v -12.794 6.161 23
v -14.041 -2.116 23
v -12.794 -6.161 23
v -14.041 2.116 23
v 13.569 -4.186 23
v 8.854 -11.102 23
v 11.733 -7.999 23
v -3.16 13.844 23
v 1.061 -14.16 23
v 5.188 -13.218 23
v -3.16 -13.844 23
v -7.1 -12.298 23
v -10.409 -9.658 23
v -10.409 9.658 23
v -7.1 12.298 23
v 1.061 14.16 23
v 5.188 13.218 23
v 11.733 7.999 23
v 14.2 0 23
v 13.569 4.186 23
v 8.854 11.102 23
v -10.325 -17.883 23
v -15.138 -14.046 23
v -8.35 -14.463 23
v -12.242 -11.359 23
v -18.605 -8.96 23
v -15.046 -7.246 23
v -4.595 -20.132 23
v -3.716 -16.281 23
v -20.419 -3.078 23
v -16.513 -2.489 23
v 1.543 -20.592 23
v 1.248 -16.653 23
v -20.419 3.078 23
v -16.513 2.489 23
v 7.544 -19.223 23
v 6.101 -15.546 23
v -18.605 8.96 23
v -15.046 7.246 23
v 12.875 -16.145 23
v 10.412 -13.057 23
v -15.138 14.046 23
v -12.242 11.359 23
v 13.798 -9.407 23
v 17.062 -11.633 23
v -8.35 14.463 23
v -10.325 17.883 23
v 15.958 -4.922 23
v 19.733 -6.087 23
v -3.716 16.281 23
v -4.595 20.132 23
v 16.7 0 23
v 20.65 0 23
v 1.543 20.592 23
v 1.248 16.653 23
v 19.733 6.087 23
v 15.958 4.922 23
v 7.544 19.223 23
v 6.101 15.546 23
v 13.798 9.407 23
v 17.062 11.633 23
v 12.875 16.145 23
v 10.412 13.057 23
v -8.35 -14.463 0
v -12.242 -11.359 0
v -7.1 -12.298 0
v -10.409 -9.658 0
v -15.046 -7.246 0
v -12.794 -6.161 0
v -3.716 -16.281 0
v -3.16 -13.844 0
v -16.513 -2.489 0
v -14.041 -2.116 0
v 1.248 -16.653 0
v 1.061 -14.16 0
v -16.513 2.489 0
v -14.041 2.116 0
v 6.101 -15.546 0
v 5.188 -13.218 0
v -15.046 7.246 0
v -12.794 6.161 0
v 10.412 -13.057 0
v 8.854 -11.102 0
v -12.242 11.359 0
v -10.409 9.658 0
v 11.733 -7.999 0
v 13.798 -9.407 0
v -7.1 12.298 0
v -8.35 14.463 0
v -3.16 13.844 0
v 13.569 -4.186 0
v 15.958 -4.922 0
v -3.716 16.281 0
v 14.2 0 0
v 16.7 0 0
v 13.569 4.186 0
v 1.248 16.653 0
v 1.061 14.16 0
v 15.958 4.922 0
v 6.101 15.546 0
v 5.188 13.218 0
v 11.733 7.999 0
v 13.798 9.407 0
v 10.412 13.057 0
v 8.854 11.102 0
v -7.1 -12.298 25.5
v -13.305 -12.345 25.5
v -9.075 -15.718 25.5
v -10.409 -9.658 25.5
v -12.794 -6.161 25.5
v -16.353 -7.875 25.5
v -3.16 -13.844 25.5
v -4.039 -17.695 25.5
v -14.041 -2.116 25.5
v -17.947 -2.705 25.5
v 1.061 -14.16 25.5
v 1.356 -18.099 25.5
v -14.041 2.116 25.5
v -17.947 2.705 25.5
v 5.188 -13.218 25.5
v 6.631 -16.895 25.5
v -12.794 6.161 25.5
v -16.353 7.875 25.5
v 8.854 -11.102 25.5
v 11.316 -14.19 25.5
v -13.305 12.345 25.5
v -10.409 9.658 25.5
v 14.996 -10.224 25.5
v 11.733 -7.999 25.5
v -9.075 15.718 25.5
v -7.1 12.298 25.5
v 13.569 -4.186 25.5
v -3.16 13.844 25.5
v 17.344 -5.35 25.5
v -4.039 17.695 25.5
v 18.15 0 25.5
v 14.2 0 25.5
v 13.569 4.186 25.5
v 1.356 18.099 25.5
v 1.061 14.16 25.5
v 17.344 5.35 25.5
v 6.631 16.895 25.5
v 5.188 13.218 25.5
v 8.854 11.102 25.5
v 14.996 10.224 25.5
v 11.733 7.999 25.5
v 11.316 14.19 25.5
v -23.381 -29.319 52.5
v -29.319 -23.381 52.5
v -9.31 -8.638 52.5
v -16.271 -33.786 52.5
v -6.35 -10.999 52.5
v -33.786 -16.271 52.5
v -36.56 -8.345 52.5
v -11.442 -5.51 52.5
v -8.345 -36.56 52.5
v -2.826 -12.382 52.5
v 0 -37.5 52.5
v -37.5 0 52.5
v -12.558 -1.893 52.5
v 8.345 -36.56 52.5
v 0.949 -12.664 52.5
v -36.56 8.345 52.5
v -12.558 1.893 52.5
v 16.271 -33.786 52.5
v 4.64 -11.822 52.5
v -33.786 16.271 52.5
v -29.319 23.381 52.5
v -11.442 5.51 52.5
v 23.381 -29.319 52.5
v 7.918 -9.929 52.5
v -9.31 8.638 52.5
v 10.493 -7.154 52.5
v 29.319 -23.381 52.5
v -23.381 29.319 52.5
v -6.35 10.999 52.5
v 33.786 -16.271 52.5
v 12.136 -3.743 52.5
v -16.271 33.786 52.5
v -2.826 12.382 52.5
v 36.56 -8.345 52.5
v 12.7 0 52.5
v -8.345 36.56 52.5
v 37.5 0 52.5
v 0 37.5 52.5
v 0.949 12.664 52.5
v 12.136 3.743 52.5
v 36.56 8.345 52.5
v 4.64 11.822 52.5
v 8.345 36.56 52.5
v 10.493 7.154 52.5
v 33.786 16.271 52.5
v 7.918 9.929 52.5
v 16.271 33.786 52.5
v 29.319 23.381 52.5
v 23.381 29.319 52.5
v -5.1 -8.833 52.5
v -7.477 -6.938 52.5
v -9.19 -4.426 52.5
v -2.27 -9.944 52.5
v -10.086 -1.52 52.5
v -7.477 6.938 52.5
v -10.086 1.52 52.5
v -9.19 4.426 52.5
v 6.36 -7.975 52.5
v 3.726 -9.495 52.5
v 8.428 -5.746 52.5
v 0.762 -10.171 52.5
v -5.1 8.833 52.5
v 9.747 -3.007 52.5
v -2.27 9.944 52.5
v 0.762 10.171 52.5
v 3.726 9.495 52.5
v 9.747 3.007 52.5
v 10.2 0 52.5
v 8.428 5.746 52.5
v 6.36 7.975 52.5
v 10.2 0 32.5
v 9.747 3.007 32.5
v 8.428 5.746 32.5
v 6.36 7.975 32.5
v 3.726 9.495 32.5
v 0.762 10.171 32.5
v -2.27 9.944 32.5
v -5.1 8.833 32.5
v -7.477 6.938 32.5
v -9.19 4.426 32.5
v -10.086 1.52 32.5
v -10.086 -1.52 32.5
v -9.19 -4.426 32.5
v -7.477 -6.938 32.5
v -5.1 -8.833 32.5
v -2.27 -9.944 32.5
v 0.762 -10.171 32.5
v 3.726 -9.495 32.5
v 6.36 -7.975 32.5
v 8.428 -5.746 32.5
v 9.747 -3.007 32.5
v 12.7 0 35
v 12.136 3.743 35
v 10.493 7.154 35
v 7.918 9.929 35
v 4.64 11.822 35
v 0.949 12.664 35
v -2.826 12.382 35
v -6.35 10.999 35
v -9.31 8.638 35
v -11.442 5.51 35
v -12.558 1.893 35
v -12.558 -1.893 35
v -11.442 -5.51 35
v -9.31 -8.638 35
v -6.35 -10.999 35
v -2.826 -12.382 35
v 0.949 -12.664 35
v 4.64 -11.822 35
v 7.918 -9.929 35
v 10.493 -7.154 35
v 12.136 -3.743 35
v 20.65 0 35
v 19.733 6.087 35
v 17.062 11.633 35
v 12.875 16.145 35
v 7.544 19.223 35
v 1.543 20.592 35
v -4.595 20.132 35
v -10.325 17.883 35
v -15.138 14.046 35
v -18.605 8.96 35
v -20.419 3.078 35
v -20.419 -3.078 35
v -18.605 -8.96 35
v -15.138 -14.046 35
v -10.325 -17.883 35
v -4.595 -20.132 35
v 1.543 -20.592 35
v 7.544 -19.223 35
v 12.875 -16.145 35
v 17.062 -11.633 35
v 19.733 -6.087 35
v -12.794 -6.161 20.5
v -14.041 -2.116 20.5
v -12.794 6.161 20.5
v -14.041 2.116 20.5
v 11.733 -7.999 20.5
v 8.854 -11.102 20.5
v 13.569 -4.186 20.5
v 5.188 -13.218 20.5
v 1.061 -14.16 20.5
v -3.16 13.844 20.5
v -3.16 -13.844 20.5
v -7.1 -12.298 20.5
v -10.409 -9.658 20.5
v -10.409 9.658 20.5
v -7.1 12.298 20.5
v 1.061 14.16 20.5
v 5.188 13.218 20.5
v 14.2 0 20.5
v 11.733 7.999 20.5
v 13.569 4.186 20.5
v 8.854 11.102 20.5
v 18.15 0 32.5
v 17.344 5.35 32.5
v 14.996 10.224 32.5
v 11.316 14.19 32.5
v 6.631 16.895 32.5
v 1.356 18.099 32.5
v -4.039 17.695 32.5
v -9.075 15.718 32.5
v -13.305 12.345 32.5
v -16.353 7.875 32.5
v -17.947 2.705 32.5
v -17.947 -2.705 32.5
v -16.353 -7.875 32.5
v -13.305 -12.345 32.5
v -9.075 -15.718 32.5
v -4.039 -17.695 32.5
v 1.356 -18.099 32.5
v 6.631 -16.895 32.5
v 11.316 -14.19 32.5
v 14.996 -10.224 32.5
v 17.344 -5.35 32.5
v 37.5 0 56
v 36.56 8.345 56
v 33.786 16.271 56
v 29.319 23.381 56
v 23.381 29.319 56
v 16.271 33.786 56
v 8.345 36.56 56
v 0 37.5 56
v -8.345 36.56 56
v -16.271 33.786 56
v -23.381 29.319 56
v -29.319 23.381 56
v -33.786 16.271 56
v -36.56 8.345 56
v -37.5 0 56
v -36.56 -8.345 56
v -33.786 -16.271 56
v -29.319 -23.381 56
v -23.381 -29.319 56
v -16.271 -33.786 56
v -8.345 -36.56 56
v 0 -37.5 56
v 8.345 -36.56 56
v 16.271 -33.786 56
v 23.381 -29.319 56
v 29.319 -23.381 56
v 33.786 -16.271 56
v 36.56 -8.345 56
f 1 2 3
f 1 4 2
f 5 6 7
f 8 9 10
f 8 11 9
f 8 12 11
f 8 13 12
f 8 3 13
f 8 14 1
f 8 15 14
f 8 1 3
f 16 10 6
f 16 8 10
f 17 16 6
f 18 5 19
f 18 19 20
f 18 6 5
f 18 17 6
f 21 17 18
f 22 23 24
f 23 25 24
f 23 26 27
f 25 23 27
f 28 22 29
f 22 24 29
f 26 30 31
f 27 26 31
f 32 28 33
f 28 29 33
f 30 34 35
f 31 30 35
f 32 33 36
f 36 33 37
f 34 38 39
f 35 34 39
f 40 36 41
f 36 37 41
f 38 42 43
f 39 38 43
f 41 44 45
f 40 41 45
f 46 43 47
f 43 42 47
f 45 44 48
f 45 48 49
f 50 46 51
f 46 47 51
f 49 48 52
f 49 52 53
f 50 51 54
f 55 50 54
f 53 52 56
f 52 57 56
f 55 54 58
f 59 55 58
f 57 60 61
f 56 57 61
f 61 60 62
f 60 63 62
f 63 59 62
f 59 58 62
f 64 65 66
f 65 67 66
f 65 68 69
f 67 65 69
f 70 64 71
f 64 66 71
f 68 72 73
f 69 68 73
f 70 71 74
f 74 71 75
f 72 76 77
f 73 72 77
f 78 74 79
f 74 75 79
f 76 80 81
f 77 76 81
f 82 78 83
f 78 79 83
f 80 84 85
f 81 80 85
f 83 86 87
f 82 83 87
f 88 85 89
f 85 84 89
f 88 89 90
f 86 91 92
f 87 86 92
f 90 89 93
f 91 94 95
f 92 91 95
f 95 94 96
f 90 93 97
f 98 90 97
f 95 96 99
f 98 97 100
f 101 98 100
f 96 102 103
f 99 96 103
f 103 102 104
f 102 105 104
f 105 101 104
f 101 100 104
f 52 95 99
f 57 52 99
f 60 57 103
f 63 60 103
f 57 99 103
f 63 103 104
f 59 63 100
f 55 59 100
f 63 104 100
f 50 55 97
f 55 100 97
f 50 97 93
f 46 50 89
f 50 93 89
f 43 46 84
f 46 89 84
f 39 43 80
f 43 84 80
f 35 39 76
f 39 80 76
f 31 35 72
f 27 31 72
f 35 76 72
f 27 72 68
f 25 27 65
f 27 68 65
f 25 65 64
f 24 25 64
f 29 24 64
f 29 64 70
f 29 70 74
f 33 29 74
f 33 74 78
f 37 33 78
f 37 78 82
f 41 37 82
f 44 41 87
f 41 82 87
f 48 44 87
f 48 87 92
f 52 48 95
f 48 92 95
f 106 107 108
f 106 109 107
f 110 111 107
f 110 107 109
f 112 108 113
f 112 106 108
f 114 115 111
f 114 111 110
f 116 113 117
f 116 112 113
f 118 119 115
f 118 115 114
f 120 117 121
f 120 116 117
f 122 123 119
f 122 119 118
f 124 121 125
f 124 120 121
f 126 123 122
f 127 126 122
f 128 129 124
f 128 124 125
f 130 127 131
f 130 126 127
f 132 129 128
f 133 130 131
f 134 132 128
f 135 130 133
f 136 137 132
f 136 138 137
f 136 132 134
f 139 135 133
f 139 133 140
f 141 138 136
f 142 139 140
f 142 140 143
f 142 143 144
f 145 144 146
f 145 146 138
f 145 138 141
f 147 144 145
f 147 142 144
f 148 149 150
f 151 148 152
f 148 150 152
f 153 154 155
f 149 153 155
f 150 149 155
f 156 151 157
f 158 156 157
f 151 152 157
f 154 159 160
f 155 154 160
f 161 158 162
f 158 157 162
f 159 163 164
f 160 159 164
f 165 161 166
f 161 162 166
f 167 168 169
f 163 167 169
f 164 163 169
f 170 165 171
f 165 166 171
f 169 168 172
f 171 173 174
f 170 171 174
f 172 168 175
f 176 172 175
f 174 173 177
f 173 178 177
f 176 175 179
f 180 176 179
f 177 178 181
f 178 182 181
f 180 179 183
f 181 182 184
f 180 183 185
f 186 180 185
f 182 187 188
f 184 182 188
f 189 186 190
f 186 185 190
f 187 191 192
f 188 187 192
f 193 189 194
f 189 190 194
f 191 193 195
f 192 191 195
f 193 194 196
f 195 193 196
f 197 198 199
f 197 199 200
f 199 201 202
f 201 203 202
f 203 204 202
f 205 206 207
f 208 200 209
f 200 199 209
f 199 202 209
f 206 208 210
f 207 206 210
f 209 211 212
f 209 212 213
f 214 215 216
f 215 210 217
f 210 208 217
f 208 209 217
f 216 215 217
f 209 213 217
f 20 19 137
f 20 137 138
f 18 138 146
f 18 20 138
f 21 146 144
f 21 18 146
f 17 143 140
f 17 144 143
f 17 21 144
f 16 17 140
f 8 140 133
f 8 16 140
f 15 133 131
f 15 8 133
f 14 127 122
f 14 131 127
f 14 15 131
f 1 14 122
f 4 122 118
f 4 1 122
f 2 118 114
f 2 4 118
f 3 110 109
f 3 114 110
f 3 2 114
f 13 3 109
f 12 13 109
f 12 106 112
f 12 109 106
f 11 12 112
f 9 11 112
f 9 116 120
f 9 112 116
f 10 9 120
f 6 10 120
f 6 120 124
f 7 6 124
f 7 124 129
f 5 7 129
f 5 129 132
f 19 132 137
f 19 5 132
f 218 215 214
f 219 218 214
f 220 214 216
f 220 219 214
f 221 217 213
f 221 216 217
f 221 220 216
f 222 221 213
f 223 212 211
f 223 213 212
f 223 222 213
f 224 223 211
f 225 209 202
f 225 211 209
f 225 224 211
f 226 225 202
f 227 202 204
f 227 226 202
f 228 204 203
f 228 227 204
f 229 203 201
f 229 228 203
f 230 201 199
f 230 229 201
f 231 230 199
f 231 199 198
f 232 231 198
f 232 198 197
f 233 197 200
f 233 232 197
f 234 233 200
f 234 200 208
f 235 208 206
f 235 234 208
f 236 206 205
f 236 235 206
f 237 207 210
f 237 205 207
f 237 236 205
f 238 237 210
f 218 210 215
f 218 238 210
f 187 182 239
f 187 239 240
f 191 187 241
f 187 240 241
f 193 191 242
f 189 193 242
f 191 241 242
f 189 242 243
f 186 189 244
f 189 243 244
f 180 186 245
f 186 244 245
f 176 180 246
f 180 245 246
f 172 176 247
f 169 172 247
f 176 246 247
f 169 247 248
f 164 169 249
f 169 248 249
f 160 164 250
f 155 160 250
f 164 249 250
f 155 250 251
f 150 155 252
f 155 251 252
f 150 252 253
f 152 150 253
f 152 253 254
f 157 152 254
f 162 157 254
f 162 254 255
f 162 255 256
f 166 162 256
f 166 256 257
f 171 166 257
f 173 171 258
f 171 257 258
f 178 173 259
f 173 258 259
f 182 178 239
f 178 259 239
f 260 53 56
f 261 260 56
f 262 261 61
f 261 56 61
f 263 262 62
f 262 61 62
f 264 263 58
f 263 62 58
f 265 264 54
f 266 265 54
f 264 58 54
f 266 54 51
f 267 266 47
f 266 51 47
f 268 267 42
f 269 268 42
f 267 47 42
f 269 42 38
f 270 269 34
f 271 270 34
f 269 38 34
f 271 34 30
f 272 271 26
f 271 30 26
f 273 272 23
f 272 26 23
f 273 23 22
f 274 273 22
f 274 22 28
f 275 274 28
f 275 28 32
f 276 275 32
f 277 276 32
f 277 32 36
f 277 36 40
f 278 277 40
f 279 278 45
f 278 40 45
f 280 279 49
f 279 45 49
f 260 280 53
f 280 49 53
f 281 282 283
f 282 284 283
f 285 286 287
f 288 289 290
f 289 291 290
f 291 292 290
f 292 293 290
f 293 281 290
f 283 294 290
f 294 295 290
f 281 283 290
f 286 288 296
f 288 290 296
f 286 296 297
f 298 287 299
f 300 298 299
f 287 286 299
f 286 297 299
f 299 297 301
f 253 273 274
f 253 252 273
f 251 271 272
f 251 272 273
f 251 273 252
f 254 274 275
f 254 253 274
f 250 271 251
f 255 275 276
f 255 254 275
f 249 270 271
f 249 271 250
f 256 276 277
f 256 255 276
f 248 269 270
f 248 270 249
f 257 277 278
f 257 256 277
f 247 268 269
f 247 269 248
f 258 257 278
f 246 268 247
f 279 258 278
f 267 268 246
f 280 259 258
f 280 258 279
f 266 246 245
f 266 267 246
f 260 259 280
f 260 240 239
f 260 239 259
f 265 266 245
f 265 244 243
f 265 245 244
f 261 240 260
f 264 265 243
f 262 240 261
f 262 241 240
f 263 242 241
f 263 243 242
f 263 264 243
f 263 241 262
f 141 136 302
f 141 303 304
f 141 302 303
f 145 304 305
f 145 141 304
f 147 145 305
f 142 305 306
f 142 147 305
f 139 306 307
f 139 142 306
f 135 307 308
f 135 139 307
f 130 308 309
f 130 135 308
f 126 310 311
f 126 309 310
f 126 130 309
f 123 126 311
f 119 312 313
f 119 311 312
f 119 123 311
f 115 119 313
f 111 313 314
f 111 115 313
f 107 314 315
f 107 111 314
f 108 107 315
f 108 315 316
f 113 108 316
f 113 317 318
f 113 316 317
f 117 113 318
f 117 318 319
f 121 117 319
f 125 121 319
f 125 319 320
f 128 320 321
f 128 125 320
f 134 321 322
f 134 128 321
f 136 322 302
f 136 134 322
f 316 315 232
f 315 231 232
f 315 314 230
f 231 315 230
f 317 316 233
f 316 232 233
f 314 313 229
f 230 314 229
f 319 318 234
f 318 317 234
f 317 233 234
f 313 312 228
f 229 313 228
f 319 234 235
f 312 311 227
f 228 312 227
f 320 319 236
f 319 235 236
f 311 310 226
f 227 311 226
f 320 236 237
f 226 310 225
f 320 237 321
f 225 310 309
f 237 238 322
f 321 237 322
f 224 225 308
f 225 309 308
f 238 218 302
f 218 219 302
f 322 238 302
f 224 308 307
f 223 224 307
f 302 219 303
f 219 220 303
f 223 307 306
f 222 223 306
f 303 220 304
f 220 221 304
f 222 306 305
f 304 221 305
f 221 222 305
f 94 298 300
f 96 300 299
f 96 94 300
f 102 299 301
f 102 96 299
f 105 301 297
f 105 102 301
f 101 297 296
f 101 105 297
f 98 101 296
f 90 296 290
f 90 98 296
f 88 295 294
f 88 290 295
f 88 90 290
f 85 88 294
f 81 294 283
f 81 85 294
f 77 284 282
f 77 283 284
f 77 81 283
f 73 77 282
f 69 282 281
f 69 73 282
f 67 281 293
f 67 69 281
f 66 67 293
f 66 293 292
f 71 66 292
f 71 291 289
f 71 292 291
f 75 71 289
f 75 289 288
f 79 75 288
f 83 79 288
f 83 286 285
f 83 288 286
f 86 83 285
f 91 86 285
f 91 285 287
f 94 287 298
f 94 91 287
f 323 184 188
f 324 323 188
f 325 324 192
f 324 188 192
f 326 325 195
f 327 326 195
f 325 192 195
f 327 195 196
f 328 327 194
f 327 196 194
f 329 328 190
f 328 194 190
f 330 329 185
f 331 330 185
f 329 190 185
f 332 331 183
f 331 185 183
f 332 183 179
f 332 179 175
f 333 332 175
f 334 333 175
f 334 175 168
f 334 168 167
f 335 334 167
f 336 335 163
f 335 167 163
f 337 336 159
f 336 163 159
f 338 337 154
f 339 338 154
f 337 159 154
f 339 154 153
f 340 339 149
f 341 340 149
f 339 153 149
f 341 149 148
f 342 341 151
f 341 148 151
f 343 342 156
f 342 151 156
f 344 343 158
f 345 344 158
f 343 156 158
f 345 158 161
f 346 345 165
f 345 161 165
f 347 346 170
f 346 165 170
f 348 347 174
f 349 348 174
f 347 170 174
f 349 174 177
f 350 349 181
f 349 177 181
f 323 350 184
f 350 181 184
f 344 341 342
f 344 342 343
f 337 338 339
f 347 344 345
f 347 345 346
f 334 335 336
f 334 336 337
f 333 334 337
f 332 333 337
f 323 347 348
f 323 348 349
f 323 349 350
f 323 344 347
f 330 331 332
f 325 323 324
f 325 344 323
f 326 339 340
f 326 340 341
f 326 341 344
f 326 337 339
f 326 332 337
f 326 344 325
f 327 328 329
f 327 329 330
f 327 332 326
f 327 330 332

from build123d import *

# Parameters (mm, degrees)
F0_R     = 16.7
F1_DEPTH = 23
F2_T     = -2.5
F3_R     = 20.65
F3_R_2   = 16.7
F4_DEPTH = 12
F5_R     = 12.7
F6_DEPTH = 17.5
F7_T     = -2.5
F8_R     = 37.5
F8_R_2   = 12.7
F8_R_3   = 10.2
F9_DEPTH = 3.5


with BuildPart() as f1:
    # F0 (on Top) → F1 (new body)
    with BuildSketch(Plane.XY):
        Circle(F0_R)
    extrude(amount=F1_DEPTH)

    # F2
    f2_openings = [f1.faces().sort_by_distance(p)[0] for p in [
        (0, 0, 0),
    ]]
    offset(amount=F2_T, openings=f2_openings)

    # F3 (on face) → F4 (join)
    with BuildSketch(Plane.XY.offset(23)):
        Circle(F3_R)
        Circle(F3_R_2, mode=Mode.SUBTRACT)
        Circle(F3_R_2)
    extrude(amount=F4_DEPTH)

    # F5 (on face) → F6 (join)
    with BuildSketch(Plane.XY.offset(35)):
        Circle(F5_R)
    extrude(amount=F6_DEPTH)

    # F7
    f7_openings = [f1.faces().sort_by_distance(p)[0] for p in [
        (0, 0, 52.5),
    ]]
    offset(amount=F7_T, openings=f7_openings, kind=Kind.INTERSECTION)

    # F8 (on face) → F9 (join)
    with BuildSketch(Plane.XY.offset(52.5)):
        Circle(F8_R)
        Circle(F8_R_2, mode=Mode.SUBTRACT)
        Circle(F8_R_2)
        Circle(F8_R_3, mode=Mode.SUBTRACT)
        Circle(F8_R_3)
    extrude(amount=F9_DEPTH)


solid = f1.part
